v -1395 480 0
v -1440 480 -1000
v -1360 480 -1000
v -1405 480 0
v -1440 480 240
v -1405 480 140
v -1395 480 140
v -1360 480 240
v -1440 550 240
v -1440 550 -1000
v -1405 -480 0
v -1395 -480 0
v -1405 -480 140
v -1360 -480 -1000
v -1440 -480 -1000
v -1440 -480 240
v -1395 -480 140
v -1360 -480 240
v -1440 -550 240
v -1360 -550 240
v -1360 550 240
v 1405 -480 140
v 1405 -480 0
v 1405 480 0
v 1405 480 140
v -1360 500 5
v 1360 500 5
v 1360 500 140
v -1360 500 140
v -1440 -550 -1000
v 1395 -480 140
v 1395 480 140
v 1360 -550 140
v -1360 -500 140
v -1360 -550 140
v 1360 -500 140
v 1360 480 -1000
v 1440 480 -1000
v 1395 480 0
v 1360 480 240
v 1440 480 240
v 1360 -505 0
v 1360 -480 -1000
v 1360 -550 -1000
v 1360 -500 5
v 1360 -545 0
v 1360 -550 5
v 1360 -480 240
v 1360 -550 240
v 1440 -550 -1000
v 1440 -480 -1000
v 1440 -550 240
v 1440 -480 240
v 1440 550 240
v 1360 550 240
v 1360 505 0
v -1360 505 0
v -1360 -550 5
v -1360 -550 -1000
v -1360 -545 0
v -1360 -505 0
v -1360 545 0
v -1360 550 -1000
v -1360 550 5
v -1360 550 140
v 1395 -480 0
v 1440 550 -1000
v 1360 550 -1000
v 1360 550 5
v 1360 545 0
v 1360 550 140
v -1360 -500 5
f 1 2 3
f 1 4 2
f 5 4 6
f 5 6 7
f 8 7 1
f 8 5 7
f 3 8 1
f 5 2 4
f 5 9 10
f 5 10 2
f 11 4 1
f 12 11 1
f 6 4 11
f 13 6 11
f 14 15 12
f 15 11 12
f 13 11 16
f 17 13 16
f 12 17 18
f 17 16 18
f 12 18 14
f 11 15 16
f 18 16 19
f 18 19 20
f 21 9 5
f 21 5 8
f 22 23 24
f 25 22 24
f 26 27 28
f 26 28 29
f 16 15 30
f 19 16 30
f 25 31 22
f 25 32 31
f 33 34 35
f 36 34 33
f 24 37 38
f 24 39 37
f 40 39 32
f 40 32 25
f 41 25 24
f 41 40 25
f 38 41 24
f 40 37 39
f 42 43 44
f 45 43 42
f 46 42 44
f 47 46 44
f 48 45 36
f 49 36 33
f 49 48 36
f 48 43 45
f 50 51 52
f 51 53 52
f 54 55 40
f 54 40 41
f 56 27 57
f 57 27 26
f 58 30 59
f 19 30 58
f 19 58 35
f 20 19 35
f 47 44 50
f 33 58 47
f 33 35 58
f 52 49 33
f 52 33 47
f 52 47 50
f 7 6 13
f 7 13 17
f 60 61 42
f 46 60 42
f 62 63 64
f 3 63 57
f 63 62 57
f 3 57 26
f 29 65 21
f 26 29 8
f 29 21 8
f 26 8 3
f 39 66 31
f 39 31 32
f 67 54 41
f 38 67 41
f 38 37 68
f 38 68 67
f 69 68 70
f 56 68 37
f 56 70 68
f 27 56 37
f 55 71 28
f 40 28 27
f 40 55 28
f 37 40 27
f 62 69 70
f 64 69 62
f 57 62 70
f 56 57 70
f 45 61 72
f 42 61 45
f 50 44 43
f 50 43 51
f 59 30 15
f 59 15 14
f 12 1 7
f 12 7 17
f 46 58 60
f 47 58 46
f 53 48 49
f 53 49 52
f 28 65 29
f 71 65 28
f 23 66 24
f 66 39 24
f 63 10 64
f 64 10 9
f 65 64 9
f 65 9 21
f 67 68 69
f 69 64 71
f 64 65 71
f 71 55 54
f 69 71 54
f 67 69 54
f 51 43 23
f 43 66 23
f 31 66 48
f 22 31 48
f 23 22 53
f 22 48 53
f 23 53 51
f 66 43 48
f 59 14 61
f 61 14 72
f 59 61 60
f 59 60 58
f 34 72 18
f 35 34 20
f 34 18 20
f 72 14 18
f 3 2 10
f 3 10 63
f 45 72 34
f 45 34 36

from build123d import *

# Parameters (mm, degrees)
PAD_DEPTH    = 140
SKETCH001_W  = 80
SKETCH001_H  = 70
PAD001_DEPTH = 100
SKETCH002_W  = 80
SKETCH002_H  = 70
PAD002_DEPTH = 1000
CHAMFER_SIZE = 5


with BuildPart() as part:
    # Sketch → Pad (new body)
    with BuildSketch(Plane.XY):
        Polygon((-1440, -550), (1440, -550), (1440, -480), (1405, -480), (1405, 480), (1440, 480), (1440, 550), (-1440, 550), (-1440, 480), (-1405, 480), (-1405, -480), (-1440, -480), align=None)
        Polygon((-1360, -500), (1360, -500), (1360, -480), (1395, -480), (1395, 480), (1360, 480), (1360, 500), (-1360, 500), (-1360, 480), (-1395, 480), (-1395, -480), (-1360, -480), align=None, mode=Mode.SUBTRACT)
    extrude(amount=PAD_DEPTH)

    # Sketch001 (on Face26 of Pad) → Pad001 (join)
    with BuildSketch(Plane.XY.offset(140)):
        with Locations((-1400, 515)):
            Rectangle(SKETCH001_W, SKETCH001_H)
        with Locations((-1400, -515)):
            Rectangle(SKETCH001_W, SKETCH001_H)
        with Locations((1400, -515)):
            Rectangle(SKETCH001_W, SKETCH001_H)
        with Locations((1400, 515)):
            Rectangle(SKETCH001_W, SKETCH001_H)
    extrude(amount=PAD001_DEPTH)

    # Sketch002 (on Face4 of Pad001) → Pad002 (join)
    with BuildSketch(Plane(origin=(0, 0, 0), x_dir=(1, 0, 0), z_dir=(0, 0, -1))):
        with Locations((1400, 515)):
            Rectangle(SKETCH002_W, SKETCH002_H)
        with Locations((1400, -515)):
            Rectangle(SKETCH002_W, SKETCH002_H)
        with Locations((-1400, -515)):
            Rectangle(SKETCH002_W, SKETCH002_H)
        with Locations((-1400, 515)):
            Rectangle(SKETCH002_W, SKETCH002_H)
    extrude(amount=PAD002_DEPTH)

    # Chamfer
    chamfer_edges = [part.edges().sort_by_distance(p)[0] for p in [
        (0, 550, 0),
        (0, 500, 0),
        (0, -500, 0),
        (0, -550, 0),
    ]]
    chamfer(chamfer_edges, length=CHAMFER_SIZE)


solid = part.part
